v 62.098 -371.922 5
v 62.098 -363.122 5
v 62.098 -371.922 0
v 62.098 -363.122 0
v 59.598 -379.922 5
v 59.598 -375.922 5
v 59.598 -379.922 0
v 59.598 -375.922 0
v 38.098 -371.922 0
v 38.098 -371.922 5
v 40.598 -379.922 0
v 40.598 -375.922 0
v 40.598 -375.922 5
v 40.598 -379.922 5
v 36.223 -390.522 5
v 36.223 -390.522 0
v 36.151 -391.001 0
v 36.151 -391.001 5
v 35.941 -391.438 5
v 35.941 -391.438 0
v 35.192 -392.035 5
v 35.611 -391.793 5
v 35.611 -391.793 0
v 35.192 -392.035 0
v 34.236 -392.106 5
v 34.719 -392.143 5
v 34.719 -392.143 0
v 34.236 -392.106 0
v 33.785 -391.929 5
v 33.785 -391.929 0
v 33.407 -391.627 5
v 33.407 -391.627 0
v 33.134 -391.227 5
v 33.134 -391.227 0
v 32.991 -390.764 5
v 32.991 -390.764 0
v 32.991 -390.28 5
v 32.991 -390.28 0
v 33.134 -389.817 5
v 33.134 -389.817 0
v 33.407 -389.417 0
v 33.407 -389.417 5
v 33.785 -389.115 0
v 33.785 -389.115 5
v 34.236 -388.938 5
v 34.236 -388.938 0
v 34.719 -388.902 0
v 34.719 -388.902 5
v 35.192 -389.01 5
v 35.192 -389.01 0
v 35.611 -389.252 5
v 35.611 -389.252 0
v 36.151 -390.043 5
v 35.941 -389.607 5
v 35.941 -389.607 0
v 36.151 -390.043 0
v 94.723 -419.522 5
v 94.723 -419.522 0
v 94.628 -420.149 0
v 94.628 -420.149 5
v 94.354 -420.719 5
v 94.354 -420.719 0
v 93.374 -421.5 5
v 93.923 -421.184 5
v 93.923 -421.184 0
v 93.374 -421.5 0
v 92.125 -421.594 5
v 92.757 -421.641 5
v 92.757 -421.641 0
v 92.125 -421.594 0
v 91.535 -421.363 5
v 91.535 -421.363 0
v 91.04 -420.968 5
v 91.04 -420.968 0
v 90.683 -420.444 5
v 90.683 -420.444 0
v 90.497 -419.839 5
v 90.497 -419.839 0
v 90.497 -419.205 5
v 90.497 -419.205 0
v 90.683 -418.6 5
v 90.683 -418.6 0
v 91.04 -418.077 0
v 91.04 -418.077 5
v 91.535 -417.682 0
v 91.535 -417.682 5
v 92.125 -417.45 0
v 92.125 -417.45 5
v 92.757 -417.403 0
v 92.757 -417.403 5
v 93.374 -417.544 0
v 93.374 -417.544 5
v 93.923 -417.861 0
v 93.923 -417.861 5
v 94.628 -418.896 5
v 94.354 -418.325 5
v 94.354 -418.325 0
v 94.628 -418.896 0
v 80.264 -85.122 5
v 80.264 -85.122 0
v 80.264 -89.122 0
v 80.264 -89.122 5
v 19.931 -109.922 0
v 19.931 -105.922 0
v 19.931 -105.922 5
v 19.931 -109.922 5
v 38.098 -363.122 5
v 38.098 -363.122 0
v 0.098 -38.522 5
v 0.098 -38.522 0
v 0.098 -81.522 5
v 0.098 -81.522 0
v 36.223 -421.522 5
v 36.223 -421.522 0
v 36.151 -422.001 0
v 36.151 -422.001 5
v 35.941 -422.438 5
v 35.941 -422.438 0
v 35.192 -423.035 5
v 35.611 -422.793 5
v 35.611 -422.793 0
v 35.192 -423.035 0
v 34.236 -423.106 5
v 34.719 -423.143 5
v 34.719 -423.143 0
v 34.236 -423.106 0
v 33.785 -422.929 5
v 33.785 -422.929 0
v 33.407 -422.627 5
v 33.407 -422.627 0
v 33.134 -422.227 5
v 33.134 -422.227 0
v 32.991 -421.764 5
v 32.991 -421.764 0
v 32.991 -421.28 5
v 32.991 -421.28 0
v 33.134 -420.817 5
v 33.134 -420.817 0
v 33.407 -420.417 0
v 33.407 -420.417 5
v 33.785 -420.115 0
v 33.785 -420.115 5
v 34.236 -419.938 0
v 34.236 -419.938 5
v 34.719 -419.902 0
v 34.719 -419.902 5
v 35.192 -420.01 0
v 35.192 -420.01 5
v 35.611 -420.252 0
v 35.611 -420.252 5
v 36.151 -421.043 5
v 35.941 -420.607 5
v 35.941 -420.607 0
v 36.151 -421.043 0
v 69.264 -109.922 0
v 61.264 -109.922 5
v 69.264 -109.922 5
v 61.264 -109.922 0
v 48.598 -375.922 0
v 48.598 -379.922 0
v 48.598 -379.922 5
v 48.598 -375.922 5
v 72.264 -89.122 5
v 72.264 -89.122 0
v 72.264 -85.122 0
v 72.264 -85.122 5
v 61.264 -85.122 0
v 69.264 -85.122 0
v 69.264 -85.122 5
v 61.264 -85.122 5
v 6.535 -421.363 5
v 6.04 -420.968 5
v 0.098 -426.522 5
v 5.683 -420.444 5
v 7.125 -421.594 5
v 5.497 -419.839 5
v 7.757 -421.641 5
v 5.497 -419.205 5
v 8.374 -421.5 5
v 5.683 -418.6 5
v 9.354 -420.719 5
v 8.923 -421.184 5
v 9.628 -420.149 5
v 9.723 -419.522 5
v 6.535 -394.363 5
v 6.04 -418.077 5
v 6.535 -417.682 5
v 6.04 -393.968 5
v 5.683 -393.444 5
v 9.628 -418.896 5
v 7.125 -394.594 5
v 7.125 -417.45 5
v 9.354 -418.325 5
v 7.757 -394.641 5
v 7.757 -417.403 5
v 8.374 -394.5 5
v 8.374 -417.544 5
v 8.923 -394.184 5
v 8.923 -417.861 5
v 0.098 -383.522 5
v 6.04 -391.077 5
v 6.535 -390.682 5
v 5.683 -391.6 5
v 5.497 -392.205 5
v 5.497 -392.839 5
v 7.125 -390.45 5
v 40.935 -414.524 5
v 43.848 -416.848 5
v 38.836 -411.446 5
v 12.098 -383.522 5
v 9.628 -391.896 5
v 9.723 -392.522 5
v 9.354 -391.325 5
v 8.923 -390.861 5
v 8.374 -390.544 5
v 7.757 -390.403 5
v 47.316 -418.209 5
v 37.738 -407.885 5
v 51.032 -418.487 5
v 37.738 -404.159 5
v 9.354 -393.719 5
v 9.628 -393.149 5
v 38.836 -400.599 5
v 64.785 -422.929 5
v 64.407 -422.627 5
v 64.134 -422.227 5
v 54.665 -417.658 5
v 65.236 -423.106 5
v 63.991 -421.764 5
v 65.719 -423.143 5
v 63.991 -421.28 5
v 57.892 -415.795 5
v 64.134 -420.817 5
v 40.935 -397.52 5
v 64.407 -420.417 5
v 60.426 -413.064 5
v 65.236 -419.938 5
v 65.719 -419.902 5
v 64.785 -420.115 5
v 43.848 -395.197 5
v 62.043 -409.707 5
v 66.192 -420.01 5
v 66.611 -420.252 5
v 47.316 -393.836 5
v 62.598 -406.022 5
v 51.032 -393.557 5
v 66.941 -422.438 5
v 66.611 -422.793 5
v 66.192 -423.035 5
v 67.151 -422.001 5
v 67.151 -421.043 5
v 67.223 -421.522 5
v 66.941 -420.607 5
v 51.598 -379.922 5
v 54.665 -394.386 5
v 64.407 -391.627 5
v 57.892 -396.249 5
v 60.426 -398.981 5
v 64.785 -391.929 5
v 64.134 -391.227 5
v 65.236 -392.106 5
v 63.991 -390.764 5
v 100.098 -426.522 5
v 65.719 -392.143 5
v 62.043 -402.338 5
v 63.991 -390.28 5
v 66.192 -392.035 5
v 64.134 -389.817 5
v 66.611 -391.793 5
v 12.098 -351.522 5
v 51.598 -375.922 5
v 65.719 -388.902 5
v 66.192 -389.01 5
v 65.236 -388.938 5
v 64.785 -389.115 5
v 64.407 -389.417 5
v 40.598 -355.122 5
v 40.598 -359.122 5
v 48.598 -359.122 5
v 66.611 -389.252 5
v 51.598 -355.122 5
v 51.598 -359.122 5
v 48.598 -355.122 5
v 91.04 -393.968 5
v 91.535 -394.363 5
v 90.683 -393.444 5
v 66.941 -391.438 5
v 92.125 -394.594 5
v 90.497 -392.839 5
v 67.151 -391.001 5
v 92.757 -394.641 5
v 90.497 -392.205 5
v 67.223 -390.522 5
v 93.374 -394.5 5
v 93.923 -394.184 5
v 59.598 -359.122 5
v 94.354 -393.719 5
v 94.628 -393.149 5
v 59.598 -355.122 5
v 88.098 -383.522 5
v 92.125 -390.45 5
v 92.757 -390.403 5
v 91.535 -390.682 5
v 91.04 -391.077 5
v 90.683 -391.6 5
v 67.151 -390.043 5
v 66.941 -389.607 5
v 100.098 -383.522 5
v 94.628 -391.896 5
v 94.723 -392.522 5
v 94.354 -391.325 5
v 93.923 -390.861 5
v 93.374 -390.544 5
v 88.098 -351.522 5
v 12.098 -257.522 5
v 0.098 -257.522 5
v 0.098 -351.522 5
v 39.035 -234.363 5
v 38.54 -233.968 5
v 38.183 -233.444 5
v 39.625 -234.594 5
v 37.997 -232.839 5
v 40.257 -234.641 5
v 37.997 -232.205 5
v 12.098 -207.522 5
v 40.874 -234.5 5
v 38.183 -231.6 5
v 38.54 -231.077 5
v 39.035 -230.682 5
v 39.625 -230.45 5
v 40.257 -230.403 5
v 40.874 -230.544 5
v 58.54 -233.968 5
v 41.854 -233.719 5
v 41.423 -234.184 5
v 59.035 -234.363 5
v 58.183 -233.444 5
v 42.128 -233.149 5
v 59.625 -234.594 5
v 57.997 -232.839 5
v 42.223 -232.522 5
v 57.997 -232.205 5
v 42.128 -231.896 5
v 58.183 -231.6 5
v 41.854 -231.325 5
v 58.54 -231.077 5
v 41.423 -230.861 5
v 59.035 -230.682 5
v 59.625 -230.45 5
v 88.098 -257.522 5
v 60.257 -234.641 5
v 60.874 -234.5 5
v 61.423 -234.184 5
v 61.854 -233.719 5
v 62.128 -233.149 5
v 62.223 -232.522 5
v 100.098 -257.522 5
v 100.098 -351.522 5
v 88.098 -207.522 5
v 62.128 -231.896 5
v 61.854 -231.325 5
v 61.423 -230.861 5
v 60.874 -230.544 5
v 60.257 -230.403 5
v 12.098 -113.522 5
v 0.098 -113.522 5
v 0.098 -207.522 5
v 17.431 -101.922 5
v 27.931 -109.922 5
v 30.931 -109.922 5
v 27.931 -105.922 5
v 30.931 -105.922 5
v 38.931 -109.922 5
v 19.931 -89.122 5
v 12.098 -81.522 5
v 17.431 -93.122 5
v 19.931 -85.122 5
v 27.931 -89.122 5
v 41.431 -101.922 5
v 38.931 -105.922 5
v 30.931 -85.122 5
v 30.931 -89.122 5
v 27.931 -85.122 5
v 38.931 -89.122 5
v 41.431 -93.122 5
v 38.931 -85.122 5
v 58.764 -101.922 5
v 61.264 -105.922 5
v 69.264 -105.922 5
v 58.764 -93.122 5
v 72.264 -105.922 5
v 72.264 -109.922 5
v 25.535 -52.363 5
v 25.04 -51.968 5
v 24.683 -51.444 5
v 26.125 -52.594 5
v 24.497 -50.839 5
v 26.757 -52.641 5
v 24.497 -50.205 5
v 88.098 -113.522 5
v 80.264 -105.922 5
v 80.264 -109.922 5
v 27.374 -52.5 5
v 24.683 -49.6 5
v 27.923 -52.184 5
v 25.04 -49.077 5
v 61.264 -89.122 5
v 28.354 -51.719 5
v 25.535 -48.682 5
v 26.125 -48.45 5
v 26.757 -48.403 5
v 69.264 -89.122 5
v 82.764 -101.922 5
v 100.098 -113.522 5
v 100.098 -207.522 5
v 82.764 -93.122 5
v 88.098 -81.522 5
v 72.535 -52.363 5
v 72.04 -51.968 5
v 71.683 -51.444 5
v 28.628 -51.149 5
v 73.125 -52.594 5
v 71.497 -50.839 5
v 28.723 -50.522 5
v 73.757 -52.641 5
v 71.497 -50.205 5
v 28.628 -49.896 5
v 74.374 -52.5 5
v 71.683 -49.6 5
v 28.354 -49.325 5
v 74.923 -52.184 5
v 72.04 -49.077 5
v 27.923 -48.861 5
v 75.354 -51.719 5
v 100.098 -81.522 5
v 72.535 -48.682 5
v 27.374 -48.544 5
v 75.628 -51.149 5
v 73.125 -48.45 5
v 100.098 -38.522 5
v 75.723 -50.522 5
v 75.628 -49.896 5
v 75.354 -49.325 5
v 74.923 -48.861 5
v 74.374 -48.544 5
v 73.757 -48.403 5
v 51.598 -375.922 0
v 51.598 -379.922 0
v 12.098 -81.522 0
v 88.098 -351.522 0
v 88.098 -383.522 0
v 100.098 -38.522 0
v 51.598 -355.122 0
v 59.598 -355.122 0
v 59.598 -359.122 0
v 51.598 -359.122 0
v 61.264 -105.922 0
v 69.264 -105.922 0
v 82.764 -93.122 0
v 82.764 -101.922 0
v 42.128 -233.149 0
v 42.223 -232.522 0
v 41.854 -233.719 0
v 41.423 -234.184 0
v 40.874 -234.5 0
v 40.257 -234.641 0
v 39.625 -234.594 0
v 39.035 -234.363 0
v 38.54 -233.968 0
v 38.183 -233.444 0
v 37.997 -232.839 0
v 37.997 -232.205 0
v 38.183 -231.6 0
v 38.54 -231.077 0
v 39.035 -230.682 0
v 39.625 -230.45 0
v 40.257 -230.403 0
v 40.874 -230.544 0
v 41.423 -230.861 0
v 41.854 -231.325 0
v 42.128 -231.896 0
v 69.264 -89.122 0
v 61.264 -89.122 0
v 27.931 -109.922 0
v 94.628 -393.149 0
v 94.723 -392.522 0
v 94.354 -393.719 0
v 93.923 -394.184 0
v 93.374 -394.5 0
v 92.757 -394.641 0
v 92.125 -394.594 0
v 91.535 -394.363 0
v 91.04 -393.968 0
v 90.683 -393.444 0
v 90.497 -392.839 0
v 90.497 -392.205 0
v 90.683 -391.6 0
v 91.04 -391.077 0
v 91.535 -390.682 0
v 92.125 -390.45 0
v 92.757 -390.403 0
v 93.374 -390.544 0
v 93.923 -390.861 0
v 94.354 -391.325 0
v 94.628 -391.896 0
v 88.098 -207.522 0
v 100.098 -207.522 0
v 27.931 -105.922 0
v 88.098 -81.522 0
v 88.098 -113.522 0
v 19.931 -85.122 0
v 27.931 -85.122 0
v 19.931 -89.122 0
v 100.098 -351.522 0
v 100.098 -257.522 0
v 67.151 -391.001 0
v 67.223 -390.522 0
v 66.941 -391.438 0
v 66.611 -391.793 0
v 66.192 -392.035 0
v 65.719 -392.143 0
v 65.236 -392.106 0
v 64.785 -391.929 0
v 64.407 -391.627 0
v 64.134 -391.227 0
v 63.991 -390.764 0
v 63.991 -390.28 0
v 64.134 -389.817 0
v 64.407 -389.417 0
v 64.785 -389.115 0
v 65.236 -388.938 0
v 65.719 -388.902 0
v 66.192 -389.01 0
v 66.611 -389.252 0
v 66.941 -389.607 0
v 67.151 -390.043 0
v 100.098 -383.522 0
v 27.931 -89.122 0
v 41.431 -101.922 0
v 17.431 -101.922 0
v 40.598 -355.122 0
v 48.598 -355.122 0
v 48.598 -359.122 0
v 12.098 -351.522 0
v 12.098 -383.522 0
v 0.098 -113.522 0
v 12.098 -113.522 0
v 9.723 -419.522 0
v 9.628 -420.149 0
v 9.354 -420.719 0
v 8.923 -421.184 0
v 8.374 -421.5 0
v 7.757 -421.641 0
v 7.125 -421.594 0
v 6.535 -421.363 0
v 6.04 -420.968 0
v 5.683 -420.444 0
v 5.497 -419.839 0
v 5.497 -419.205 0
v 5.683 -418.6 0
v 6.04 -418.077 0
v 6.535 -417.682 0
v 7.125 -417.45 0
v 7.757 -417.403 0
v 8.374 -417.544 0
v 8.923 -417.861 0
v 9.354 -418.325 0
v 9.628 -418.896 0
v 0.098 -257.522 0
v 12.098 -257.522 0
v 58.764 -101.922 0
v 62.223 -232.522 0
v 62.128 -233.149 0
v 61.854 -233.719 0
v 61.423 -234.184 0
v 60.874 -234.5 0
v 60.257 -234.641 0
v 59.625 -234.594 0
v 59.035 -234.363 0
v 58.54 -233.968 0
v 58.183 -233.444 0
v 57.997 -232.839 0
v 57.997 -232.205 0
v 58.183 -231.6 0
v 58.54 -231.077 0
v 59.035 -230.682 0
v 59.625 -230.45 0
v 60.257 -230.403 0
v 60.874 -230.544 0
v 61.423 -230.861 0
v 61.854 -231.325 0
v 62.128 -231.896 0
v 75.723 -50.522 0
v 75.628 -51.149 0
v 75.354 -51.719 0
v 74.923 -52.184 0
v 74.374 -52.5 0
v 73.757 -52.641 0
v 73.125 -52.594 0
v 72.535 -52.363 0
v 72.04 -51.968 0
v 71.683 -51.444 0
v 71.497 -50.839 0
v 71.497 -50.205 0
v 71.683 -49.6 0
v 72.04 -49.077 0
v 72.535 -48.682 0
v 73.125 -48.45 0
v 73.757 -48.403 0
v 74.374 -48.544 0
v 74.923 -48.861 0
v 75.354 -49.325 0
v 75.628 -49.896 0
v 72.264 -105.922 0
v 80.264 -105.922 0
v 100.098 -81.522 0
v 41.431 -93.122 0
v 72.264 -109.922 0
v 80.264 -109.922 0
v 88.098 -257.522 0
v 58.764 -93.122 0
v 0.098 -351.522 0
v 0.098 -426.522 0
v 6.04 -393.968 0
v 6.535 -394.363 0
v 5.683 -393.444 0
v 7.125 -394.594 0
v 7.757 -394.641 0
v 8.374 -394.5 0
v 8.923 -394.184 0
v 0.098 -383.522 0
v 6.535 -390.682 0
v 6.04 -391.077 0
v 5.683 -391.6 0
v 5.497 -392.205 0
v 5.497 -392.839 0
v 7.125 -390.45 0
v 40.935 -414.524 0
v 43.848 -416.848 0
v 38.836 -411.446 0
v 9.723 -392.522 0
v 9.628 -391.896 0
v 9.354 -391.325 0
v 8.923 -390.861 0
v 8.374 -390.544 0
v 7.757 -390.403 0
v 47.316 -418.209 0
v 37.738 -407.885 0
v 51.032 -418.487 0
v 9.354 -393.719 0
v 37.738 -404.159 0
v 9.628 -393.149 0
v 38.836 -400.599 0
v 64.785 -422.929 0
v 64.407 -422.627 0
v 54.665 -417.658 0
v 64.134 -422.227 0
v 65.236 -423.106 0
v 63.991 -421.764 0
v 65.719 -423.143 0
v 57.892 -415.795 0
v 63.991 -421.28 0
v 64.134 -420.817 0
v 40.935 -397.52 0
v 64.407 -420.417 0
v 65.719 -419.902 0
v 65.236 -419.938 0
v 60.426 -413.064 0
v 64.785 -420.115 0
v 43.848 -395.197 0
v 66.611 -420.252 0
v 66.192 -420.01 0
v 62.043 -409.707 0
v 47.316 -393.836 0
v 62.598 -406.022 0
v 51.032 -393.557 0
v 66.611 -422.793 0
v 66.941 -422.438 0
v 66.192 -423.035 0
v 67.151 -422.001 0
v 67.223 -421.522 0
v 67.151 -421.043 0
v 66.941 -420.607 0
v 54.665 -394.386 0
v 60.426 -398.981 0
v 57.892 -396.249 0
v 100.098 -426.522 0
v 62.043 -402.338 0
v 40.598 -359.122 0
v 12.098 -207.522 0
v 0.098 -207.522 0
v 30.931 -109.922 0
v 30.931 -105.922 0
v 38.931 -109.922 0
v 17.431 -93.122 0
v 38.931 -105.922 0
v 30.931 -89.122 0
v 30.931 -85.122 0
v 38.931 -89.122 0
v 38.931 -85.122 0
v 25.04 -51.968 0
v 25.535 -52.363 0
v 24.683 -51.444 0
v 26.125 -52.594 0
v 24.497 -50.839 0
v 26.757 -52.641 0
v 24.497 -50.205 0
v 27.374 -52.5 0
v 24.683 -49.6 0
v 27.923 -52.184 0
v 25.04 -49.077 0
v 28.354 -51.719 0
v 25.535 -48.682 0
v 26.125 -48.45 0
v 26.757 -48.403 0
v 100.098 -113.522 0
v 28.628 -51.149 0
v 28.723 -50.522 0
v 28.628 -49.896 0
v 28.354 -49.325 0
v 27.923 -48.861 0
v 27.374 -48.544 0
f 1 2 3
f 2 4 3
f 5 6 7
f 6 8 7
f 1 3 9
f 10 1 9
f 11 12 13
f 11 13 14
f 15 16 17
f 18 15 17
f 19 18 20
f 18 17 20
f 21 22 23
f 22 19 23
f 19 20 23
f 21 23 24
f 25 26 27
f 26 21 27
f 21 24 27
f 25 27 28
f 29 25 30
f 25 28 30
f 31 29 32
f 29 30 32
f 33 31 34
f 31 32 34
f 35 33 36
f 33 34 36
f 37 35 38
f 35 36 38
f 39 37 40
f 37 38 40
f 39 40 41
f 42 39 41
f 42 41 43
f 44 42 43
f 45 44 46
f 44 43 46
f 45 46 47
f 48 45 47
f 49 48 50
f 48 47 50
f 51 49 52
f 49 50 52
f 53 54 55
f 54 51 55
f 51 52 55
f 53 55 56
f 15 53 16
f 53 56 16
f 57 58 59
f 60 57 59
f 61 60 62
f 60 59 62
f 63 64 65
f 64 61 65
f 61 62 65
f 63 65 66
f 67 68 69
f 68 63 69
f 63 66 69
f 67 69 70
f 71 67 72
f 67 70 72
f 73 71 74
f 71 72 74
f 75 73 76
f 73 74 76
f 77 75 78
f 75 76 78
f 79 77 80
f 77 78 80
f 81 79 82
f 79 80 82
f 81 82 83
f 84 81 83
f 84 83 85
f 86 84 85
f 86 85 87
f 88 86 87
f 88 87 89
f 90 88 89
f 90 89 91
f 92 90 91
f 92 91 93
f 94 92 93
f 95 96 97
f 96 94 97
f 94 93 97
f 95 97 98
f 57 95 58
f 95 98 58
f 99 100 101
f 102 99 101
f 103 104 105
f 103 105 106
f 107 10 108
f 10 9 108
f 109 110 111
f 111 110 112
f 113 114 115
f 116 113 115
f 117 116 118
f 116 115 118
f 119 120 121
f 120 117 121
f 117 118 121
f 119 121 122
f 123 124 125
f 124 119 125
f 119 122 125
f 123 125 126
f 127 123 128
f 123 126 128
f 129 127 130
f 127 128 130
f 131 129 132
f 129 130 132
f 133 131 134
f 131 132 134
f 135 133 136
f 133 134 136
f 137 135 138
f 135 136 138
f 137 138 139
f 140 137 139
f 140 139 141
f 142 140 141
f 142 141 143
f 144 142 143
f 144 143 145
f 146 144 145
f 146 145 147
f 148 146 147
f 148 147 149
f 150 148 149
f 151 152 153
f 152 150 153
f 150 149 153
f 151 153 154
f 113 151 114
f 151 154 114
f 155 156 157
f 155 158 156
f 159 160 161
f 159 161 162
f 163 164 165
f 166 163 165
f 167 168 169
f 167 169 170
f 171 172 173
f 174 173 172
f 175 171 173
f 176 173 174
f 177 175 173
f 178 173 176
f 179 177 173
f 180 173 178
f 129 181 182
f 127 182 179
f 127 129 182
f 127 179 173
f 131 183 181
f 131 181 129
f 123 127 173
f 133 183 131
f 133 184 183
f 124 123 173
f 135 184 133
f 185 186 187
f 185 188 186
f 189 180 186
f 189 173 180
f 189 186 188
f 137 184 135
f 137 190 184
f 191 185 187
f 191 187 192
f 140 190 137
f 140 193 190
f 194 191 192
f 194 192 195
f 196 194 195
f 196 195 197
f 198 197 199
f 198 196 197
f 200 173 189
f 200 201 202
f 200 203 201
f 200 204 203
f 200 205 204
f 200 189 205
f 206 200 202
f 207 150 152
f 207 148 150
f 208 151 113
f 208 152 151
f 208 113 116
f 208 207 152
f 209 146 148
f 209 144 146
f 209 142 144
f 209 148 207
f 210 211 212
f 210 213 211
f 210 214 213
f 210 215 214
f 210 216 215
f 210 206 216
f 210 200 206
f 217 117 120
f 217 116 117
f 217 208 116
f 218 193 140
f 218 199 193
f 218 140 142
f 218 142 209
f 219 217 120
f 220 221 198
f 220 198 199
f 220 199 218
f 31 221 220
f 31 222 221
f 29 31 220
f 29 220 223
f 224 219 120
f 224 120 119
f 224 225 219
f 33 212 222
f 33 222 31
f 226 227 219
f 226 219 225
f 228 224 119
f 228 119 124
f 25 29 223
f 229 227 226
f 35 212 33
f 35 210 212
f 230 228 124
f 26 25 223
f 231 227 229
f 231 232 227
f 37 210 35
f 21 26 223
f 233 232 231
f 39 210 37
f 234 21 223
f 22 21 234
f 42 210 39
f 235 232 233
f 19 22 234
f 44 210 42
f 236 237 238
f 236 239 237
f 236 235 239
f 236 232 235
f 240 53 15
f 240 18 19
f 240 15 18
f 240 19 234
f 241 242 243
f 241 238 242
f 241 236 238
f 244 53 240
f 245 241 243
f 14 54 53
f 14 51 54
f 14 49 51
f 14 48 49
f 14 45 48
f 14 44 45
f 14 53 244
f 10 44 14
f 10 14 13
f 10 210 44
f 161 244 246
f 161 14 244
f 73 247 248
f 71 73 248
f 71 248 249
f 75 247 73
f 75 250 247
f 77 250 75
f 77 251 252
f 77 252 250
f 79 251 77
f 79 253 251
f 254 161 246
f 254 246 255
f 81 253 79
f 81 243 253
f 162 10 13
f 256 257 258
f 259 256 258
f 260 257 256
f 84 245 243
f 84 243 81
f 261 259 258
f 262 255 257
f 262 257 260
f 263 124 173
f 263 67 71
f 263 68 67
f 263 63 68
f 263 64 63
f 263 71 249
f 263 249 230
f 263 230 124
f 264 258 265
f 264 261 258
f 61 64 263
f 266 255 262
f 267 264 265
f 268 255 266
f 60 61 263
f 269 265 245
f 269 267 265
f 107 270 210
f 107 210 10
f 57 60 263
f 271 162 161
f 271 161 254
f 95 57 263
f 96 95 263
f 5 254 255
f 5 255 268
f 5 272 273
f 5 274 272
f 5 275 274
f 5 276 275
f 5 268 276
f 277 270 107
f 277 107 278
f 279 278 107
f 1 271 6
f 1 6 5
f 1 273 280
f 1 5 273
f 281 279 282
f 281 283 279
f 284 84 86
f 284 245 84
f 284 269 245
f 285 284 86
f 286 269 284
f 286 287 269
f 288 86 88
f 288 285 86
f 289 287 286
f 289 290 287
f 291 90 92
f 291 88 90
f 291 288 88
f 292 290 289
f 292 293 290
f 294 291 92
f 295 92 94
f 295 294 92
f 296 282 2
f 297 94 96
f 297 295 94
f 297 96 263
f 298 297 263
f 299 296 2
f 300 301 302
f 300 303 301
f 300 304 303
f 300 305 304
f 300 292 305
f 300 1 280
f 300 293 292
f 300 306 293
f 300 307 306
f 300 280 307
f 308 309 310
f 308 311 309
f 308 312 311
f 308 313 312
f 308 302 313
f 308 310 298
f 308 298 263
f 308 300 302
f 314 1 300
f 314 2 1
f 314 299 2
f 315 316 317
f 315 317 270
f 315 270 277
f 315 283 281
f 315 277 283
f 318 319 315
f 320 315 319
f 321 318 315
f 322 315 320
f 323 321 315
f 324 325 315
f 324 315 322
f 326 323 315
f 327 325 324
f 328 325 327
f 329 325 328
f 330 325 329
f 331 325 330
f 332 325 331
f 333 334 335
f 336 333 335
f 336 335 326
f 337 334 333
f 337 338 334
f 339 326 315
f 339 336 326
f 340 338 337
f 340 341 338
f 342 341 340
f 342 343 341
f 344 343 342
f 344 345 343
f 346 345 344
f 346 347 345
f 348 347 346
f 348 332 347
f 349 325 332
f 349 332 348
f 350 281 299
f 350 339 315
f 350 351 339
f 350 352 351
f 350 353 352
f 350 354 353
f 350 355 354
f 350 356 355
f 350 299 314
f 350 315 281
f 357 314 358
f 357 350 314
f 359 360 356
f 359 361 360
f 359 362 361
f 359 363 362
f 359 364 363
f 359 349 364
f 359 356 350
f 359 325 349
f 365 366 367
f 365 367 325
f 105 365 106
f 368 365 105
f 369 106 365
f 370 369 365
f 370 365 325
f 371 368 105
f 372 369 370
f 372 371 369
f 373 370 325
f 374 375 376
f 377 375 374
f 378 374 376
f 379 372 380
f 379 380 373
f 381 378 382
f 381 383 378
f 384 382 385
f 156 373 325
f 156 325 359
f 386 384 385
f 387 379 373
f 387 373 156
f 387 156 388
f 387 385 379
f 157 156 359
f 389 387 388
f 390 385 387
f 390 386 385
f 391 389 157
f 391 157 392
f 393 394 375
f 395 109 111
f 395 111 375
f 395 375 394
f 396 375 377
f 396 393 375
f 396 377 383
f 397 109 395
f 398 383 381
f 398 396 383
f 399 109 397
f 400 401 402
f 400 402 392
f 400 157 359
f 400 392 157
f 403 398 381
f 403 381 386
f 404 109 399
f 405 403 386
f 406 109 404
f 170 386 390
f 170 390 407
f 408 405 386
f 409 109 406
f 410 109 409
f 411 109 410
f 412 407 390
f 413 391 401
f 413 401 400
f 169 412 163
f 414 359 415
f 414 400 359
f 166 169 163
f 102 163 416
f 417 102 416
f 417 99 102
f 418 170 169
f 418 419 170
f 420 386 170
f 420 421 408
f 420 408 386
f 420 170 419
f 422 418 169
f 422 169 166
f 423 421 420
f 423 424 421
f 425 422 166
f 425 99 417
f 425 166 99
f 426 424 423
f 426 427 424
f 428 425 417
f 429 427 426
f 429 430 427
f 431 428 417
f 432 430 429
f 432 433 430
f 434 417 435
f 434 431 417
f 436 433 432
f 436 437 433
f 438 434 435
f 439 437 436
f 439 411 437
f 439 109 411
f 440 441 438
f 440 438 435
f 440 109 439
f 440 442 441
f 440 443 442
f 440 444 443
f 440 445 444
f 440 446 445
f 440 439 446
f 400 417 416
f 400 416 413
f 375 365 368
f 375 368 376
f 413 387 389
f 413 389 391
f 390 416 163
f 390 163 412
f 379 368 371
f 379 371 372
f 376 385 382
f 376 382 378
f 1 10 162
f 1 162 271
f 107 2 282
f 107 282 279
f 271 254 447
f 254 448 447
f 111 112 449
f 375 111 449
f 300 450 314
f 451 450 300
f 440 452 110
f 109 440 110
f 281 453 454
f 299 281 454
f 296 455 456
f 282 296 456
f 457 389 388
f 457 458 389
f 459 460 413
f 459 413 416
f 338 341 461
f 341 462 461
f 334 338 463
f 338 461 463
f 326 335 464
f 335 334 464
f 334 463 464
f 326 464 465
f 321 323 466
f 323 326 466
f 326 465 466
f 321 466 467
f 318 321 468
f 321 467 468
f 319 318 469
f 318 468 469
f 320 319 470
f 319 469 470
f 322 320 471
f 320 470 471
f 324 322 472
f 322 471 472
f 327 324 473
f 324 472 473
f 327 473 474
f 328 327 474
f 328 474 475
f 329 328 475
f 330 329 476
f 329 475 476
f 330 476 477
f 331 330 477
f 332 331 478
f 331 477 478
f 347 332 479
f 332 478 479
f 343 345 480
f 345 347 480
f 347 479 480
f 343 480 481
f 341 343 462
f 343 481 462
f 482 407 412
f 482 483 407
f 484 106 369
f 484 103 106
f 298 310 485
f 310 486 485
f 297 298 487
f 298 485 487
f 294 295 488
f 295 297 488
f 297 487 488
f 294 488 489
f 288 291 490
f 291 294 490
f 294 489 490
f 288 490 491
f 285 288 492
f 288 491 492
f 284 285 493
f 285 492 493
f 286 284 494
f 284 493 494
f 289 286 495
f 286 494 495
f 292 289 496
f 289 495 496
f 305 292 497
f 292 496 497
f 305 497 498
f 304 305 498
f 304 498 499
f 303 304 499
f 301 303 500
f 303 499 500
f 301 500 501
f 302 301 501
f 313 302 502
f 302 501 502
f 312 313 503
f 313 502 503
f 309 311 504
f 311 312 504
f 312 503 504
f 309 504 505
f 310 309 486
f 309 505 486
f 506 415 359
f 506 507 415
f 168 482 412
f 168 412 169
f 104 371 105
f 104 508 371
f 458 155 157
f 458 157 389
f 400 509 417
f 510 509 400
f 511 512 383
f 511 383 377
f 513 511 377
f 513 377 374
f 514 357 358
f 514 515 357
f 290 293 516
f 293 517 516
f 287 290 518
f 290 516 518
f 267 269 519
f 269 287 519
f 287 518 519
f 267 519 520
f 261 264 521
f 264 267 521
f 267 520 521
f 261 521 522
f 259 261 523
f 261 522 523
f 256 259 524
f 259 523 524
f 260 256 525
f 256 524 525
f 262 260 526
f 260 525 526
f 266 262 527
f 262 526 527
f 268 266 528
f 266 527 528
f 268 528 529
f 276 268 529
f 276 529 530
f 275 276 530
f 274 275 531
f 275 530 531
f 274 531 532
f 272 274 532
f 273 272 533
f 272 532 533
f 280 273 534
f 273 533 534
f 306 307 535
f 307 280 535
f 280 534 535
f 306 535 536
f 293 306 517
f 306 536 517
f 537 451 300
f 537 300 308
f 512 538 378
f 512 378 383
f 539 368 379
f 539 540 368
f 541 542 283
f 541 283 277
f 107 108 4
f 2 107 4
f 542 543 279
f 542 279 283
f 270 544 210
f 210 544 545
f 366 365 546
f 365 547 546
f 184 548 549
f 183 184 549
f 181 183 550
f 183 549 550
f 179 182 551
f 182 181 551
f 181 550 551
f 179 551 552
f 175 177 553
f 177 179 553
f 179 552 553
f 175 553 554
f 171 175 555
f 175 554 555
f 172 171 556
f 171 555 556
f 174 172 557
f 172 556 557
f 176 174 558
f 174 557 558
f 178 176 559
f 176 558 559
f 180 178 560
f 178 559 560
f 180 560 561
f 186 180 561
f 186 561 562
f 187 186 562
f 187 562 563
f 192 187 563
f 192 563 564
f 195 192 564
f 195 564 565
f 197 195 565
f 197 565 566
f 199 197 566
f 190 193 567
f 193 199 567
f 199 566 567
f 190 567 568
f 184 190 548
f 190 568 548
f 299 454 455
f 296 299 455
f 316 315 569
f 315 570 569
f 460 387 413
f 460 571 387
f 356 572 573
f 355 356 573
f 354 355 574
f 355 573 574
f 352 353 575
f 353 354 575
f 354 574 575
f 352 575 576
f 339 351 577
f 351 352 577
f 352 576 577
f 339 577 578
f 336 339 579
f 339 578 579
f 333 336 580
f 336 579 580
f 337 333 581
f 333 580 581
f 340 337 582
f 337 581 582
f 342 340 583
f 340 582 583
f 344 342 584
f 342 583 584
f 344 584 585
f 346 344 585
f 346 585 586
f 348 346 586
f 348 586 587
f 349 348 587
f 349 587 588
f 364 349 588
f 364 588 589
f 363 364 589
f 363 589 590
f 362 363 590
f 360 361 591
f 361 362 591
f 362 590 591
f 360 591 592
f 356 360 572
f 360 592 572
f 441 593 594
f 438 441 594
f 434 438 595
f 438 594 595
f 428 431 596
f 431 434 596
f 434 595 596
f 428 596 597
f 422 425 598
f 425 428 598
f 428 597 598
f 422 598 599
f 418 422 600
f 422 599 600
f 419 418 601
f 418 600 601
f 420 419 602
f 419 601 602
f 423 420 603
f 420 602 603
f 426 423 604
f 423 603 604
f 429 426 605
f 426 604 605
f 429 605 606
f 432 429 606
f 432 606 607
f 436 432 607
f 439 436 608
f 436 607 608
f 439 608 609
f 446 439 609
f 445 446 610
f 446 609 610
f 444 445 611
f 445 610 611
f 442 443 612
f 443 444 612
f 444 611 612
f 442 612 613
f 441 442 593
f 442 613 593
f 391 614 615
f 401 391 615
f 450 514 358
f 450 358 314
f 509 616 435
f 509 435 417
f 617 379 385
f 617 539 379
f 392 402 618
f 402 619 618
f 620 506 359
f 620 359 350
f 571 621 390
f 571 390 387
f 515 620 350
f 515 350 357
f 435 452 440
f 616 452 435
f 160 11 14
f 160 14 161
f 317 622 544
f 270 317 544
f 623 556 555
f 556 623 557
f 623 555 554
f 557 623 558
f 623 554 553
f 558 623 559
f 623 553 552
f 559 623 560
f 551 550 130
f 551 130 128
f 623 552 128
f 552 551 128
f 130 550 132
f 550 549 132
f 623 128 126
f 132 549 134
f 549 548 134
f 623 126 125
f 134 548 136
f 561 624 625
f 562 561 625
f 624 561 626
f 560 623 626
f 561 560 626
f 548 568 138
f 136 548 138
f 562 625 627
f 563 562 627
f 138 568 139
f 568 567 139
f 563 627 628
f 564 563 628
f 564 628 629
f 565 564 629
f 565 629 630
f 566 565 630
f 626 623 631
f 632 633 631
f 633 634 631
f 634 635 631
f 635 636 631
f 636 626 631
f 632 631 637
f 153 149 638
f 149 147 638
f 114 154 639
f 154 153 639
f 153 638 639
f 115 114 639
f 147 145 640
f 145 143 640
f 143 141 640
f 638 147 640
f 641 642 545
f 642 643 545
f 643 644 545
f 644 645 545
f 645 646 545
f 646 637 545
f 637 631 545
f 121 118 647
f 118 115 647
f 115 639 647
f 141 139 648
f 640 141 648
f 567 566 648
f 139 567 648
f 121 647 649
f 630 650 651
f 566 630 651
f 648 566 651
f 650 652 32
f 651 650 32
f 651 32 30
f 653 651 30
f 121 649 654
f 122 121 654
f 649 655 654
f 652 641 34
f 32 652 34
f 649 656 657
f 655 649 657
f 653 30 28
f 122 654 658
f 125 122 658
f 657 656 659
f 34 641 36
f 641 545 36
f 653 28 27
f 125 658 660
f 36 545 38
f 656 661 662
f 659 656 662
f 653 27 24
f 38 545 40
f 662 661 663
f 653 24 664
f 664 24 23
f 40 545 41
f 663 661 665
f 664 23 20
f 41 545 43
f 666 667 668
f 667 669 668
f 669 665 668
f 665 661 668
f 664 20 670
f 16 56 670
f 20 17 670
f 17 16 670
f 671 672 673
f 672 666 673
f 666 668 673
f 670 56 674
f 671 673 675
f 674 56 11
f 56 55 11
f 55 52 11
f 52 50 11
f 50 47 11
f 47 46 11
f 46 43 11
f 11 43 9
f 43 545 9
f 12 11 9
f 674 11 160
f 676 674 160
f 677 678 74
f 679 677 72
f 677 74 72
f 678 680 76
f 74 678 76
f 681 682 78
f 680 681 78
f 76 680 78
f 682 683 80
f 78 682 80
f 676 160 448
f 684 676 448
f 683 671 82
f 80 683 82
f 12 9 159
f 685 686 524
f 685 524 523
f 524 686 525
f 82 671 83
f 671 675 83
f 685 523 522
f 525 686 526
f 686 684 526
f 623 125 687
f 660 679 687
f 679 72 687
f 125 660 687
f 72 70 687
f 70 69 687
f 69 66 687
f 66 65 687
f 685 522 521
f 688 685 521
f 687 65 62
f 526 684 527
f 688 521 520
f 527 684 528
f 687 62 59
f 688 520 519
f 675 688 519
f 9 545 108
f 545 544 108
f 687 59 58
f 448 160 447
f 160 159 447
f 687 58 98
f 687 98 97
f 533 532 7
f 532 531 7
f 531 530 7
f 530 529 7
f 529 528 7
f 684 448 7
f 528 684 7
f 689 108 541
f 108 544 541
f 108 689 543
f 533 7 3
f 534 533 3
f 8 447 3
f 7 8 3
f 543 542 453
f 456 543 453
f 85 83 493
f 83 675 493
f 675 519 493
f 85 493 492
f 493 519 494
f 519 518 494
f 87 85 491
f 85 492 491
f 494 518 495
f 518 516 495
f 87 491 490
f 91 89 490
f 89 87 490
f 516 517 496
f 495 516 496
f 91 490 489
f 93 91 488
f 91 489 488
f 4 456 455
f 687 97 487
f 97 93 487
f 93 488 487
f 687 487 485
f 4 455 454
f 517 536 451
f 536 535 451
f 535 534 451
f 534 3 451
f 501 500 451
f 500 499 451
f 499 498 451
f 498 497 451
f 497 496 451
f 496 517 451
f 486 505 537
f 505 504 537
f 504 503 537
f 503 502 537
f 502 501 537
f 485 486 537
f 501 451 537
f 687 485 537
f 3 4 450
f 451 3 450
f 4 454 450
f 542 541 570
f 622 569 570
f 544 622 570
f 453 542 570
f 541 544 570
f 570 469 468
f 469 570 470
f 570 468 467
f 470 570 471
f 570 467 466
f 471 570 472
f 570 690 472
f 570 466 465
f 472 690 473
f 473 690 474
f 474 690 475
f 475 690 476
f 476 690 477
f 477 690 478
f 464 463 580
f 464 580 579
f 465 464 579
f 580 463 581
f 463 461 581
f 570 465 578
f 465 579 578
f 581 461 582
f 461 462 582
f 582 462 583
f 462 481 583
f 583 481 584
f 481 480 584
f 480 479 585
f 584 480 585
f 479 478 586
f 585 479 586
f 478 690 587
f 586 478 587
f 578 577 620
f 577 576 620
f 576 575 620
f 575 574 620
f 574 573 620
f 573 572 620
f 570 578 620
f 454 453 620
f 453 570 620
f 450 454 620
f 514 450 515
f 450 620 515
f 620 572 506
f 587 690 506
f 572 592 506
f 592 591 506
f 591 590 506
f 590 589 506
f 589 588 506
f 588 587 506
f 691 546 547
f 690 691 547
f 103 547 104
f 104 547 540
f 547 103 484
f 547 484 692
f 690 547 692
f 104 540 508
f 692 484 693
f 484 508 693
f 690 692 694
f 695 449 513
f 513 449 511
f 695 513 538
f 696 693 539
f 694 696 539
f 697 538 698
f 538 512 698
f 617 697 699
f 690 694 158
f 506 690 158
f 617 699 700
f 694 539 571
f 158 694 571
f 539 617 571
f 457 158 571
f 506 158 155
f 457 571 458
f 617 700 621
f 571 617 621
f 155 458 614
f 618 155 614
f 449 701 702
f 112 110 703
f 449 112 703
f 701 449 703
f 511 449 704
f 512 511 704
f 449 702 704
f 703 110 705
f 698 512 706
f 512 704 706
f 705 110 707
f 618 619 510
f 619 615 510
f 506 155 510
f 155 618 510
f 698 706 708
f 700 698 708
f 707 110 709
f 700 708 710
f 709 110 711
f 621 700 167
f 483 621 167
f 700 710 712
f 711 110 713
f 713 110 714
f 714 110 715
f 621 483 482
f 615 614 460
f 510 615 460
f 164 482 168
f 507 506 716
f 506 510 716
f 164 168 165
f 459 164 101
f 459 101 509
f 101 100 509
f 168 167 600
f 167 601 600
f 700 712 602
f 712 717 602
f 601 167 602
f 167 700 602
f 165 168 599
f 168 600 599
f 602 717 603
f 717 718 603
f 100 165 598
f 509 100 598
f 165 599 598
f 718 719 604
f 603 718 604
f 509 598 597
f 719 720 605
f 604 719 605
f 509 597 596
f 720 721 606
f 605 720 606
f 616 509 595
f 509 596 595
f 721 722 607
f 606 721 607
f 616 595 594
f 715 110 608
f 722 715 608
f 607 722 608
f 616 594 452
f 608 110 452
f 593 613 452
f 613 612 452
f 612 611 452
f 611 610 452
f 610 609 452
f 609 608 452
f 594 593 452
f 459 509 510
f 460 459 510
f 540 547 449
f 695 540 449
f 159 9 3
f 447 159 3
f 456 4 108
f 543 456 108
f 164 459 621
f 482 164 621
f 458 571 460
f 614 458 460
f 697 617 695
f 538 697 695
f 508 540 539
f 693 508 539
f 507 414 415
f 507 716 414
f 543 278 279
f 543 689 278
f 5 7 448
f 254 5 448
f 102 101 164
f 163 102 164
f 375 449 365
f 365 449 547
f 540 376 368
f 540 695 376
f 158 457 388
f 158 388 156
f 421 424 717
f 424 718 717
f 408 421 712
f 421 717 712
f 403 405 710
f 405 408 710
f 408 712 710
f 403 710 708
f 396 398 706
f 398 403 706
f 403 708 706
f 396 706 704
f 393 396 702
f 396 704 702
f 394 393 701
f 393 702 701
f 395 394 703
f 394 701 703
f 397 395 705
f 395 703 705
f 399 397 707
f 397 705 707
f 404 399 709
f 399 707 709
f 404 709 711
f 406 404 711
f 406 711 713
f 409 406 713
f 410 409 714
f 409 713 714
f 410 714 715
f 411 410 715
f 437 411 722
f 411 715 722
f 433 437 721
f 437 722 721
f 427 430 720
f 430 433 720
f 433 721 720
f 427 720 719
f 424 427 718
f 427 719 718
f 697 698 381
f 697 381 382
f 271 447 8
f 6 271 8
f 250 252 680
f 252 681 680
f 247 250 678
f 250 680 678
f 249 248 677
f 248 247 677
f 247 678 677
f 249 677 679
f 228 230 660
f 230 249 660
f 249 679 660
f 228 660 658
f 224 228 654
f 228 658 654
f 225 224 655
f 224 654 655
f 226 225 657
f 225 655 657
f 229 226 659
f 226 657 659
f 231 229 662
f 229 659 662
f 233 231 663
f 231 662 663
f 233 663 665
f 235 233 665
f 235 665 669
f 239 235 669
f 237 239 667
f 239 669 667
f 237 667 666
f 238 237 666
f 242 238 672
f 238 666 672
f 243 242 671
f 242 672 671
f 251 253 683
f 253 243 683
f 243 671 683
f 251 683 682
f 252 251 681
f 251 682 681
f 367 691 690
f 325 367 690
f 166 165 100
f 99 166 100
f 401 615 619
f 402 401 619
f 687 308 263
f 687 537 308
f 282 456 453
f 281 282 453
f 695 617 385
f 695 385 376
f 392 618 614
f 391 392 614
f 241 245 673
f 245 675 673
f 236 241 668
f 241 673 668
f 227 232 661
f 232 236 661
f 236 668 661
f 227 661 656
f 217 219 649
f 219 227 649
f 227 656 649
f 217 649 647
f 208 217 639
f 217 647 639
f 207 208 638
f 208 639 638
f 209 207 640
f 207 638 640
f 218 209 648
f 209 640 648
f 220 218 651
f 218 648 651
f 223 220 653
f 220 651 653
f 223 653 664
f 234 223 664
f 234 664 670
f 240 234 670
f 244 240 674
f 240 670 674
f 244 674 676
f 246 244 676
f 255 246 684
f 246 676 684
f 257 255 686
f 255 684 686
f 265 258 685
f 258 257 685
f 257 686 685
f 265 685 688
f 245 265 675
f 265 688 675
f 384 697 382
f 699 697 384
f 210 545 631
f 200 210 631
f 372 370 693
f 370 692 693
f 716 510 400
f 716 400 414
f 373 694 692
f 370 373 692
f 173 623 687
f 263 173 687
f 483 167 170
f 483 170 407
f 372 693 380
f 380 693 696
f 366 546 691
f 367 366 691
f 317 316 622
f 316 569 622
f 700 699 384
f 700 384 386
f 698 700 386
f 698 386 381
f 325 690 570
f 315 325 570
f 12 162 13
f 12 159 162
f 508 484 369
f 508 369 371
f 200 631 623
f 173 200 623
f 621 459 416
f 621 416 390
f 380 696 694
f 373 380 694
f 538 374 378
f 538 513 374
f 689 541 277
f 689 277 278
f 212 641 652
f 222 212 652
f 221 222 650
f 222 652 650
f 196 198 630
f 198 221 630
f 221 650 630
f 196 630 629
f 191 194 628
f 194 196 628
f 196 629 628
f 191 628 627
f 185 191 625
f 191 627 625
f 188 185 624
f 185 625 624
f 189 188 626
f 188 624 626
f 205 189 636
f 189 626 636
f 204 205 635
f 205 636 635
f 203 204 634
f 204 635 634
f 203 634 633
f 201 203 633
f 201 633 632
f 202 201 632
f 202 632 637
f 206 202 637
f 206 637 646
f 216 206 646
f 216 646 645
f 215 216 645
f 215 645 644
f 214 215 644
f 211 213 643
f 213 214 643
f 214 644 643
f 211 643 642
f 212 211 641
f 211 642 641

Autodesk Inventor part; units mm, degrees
ref_plane "YZ Plane" through (0, 0, 0) normal (1, 0, 0) x (0, 1, 0)
ref_plane "XZ Plane" through (0, 0, 0) normal (0, 1, 0) x (-1, 0, 0)
ref_plane "XY Plane" through (0, 0, 0) normal (0, 0, 1) x (1, 0, 0)
sketch "Sketch1" plane through (0, 0, 0) normal (0, 0, 1) x (1, 0, 0)
  line L0 (100.0979, -38.5222) -> (0.0979, -38.5222)
  line L1 (0.0979, -426.5222) -> (100.0979, -426.5222)
  line L2 (82.7645, -93.1222) -> (58.7645, -93.1222)
  line L3 (58.7645, -93.1222) -> (58.7645, -101.9222)
  line L4 (58.7645, -101.9222) -> (82.7645, -101.9222)
  line L5 (82.7645, -101.9222) -> (82.7645, -93.1222)
  line L6 (41.4312, -93.1222) -> (17.4312, -93.1222)
  line L7 (17.4312, -93.1222) -> (17.4312, -101.9222)
  line L8 (17.4312, -101.9222) -> (41.4312, -101.9222)
  line L9 (41.4312, -101.9222) -> (41.4312, -93.1222)
  line L10 (38.0979, -363.1222) -> (62.0979, -363.1222)
  line L11 (62.0979, -363.1222) -> (62.0979, -371.9222)
  line L12 (62.0979, -371.9222) -> (38.0979, -371.9222)
  line L13 (38.0979, -371.9222) -> (38.0979, -363.1222)
  line L14 (173.8639, -93.5222) -> (-221.1361, -93.5222)
  line L15 (173.8639, -101.5222) -> (-221.1361, -101.5222)
  line L16 (173.8639, -371.5222) -> (-221.1361, -371.5222)
  line L17 (173.8639, -363.5222) -> (-221.1361, -363.5222)
  line L18 (34.8712, -93.1222) -> (34.8712, -93.5222) construction
  line L19 (34.8712, -101.5222) -> (34.8712, -101.9222) construction
  line L20 (58.7645, -93.1222) -> (41.4312, -93.1222) construction
  line L21 (10.9151, -363.1222) -> (10.9151, -363.5222) construction
  line L22 (10.9151, -371.5222) -> (10.9151, -371.9222) construction
  line L23 (38.0979, -363.1222) -> (12.0979, -363.1222) construction
  line L24 (62.0979, -363.1222) -> (88.0979, -363.1222) construction
  line L25 (0, 0) -> (0, -9.7735) construction
  circle A0 centre (65.5979, -390.5222) radius 1.625
  circle A1 centre (65.5979, -421.5222) radius 1.625
  circle A2 centre (34.5979, -421.5222) radius 1.625
  circle A3 centre (34.5979, -390.5222) radius 1.625
  line L26 (65.5979, -390.5222) -> (34.5979, -390.5222) construction
  line L27 (34.5979, -390.5222) -> (34.5979, -421.5222) construction
  line L28 (34.5979, -421.5222) -> (65.5979, -421.5222) construction
  line L29 (65.5979, -421.5222) -> (65.5979, -390.5222) construction
  circle A4 centre (50.0979, -406.0222) radius 12.5
  line L30 (50.0979, -390.5222) -> (50.0979, -406.0222) construction
  line L31 (50.0979, -406.0222) -> (65.5979, -406.0222) construction
  line L32 (72.2645, -85.1222) -> (80.2645, -85.1222)
  line L33 (80.2645, -85.1222) -> (80.2645, -89.1222)
  line L34 (80.2645, -89.1222) -> (72.2645, -89.1222)
  line L35 (72.2645, -89.1222) -> (72.2645, -85.1222)
  line L36 (80.2645, -89.1222) -> (82.7645, -89.1222) construction
  line L37 (82.7645, -89.1222) -> (82.7645, -93.1222) construction
  line L38 (69.2645, -85.1222) -> (61.2645, -85.1222)
  line L39 (61.2645, -85.1222) -> (61.2645, -89.1222)
  line L40 (61.2645, -89.1222) -> (69.2645, -89.1222)
  line L41 (69.2645, -89.1222) -> (69.2645, -85.1222)
  line L42 (58.7645, -93.1222) -> (58.7645, -89.1222) construction
  line L43 (58.7645, -89.1222) -> (61.2645, -89.1222) construction
  line L44 (72.2645, -105.9222) -> (80.2645, -105.9222)
  line L45 (80.2645, -105.9222) -> (80.2645, -109.9222)
  line L46 (80.2645, -109.9222) -> (72.2645, -109.9222)
  line L47 (72.2645, -109.9222) -> (72.2645, -105.9222)
  line L48 (80.2645, -105.9222) -> (80.2645, -101.9222) construction
  line L49 (69.2645, -105.9222) -> (61.2645, -105.9222)
  line L50 (61.2645, -105.9222) -> (61.2645, -109.9222)
  line L51 (61.2645, -109.9222) -> (69.2645, -109.9222)
  line L52 (69.2645, -109.9222) -> (69.2645, -105.9222)
  line L53 (38.9312, -85.1222) -> (30.9312, -85.1222)
  line L54 (30.9312, -85.1222) -> (30.9312, -89.1222)
  line L55 (30.9312, -89.1222) -> (38.9312, -89.1222)
  line L56 (38.9312, -89.1222) -> (38.9312, -85.1222)
  line L57 (27.9312, -85.1222) -> (19.9312, -85.1222)
  line L58 (19.9312, -85.1222) -> (19.9312, -89.1222)
  line L59 (19.9312, -89.1222) -> (27.9312, -89.1222)
  line L60 (27.9312, -89.1222) -> (27.9312, -85.1222)
  line L61 (30.9312, -105.9222) -> (38.9312, -105.9222)
  line L62 (38.9312, -105.9222) -> (38.9312, -109.9222)
  line L63 (38.9312, -109.9222) -> (30.9312, -109.9222)
  line L64 (30.9312, -109.9222) -> (30.9312, -105.9222)
  line L65 (27.9312, -105.9222) -> (19.9312, -105.9222)
  line L66 (19.9312, -105.9222) -> (19.9312, -109.9222)
  line L67 (19.9312, -109.9222) -> (27.9312, -109.9222)
  line L68 (27.9312, -109.9222) -> (27.9312, -105.9222)
  line L69 (41.4312, -93.1222) -> (41.4312, -89.1222) construction
  line L70 (41.4312, -89.1222) -> (38.9312, -89.1222) construction
  line L71 (17.4312, -93.1222) -> (17.4312, -89.1222) construction
  line L72 (17.4312, -89.1222) -> (19.9312, -89.1222) construction
  line L73 (51.5979, -355.1222) -> (59.5979, -355.1222)
  line L74 (59.5979, -355.1222) -> (59.5979, -359.1222)
  line L75 (59.5979, -359.1222) -> (51.5979, -359.1222)
  line L76 (51.5979, -359.1222) -> (51.5979, -355.1222)
  line L77 (48.5979, -355.1222) -> (40.5979, -355.1222)
  line L78 (40.5979, -355.1222) -> (40.5979, -359.1222)
  line L79 (40.5979, -359.1222) -> (48.5979, -359.1222)
  line L80 (48.5979, -359.1222) -> (48.5979, -355.1222)
  line L81 (51.5979, -375.9222) -> (59.5979, -375.9222)
  line L82 (59.5979, -375.9222) -> (59.5979, -379.9222)
  line L83 (59.5979, -379.9222) -> (51.5979, -379.9222)
  line L84 (51.5979, -379.9222) -> (51.5979, -375.9222)
  line L85 (48.5979, -375.9222) -> (40.5979, -375.9222)
  line L86 (40.5979, -375.9222) -> (40.5979, -379.9222)
  line L87 (40.5979, -379.9222) -> (48.5979, -379.9222)
  line L88 (48.5979, -379.9222) -> (48.5979, -375.9222)
  line L89 (59.5979, -359.1222) -> (62.0979, -359.1222) construction
  line L90 (62.0979, -359.1222) -> (62.0979, -363.1222) construction
  line L91 (38.0979, -363.1222) -> (38.0979, -359.1222) construction
  line L92 (38.0979, -359.1222) -> (40.5979, -359.1222) construction
  line L93 (59.5979, -375.9222) -> (59.5979, -371.9222) construction
  circle A5 centre (73.5979, -50.5222) radius 2.125
  circle A6 centre (26.5979, -50.5222) radius 2.125
  line L94 (73.5979, -50.5222) -> (100.0979, -50.5222) construction
  line L95 (26.5979, -50.5222) -> (0.0979, -50.5222) construction
  line L96 (96.5979, -57.5222) -> (88.5979, -57.5222) projected
  line L97 (11.5979, -57.5222) -> (3.5979, -57.5222) projected
  line L98 (8.0979, -43.5222) -> (8.0979, -57.5222) projected
  line L99 (7.0979, -57.5222) -> (7.0979, -43.5222) projected
  line L100 (93.0979, -43.5222) -> (93.0979, -57.5222) projected
  line L101 (92.0979, -57.5222) -> (92.0979, -43.5222) projected
  line L102 (7.5979, -57.5222) -> (7.5979, -426.5222) construction
  line L103 (92.5979, -57.5222) -> (92.5979, -426.5222) construction
  circle A7 centre (92.5979, -419.5222) radius 2.125
  circle A8 centre (92.5979, -392.5222) radius 2.125
  circle A9 centre (7.5979, -419.5222) radius 2.125
  circle A10 centre (7.5979, -392.5222) radius 2.125
  line L104 (92.5979, -419.5222) -> (7.5979, -419.5222) construction
  line L105 (92.5979, -392.5222) -> (7.5979, -392.5222) construction
  line L106 (100.0979, -38.5222) -> (100.0979, -81.5222)
  line L107 (100.0979, -81.5222) -> (88.0979, -81.5222)
  line L108 (88.0979, -81.5222) -> (88.0979, -113.5222)
  line L109 (88.0979, -113.5222) -> (100.0979, -113.5222)
  line L110 (100.0979, -351.5222) -> (88.0979, -351.5222)
  line L111 (88.0979, -351.5222) -> (88.0979, -383.5222)
  line L112 (88.0979, -383.5222) -> (100.0979, -383.5222)
  line L113 (100.0979, -383.5222) -> (100.0979, -426.5222)
  line L114 (100.0979, -81.5222) -> (100.0979, -93.5222) construction
  line L115 (100.0979, -101.5222) -> (100.0979, -113.5222) construction
  line L116 (0.0979, -38.5222) -> (0.0979, -81.5222)
  line L117 (0.0979, -81.5222) -> (12.0979, -81.5222)
  line L118 (12.0979, -81.5222) -> (12.0979, -113.5222)
  line L119 (12.0979, -113.5222) -> (0.0979, -113.5222)
  line L120 (0.0979, -351.5222) -> (12.0979, -351.5222)
  line L121 (12.0979, -351.5222) -> (12.0979, -383.5222)
  line L122 (12.0979, -383.5222) -> (0.0979, -383.5222)
  line L123 (0.0979, -383.5222) -> (0.0979, -426.5222)
  line L124 (98.1469, -351.5222) -> (98.1469, -363.5222) construction
  line L125 (98.1469, -383.5222) -> (98.1469, -371.5222) construction
  line L126 (17.4312, -93.1222) -> (12.0979, -93.1222) construction
  line L127 (82.7645, -93.1222) -> (88.0979, -93.1222) construction
  line L128 (82.7645, -97.5222) -> (100.0979, -97.5222) construction
  line L129 (58.7645, -97.5222) -> (41.4312, -97.5222) construction
  line L130 (17.4312, -97.5222) -> (0.0979, -97.5222) construction
  line L131 (38.0979, -367.5222) -> (0.0979, -367.5222) construction
  line L132 (62.0979, -367.5222) -> (100.0979, -367.5222) construction
  line L133 (100.0979, -113.5222) -> (100.0979, -207.5222)
  line L134 (100.0979, -207.5222) -> (88.0979, -207.5222)
  line L135 (88.0979, -207.5222) -> (88.0979, -257.5222)
  line L136 (88.0979, -257.5222) -> (100.0979, -257.5222)
  line L137 (100.0979, -257.5222) -> (100.0979, -351.5222)
  line L138 (0.0979, -113.5222) -> (0.0979, -207.5222)
  line L139 (0.0979, -207.5222) -> (12.0979, -207.5222)
  line L140 (12.0979, -207.5222) -> (12.0979, -257.5222)
  line L141 (12.0979, -257.5222) -> (0.0979, -257.5222)
  line L142 (0.0979, -257.5222) -> (0.0979, -351.5222)
  line L143 (34.5979, -390.5222) -> (0.0979, -390.5222) construction
  line L144 (65.5979, -390.5222) -> (100.0979, -390.5222) construction
  circle A11 centre (40.0979, -232.5222) radius 2.125
  circle A12 centre (60.0979, -232.5222) radius 2.125
  line L145 (40.0979, -232.5222) -> (60.0979, -232.5222) construction
  line L146 (40.0979, -232.5222) -> (12.0979, -232.5222) construction
  line L147 (60.0979, -232.5222) -> (88.0979, -232.5222) construction
  dimension "d1" = 24
  dimension "d2" = 8.8
  dimension "d3" = 100
  dimension "d9" = 55
  dimension "d10" = 55
  dimension "d11" = 3.25
  dimension "d12" = 31
  dimension "d13" = 5
  dimension "d14" = 25
  dimension "d15" = 4
  dimension "d16" = 8
  dimension "d17" = 4
  dimension "d18" = 2.5
  dimension "d19" = 4.25
  dimension "d20" = 4.25
  dimension "d21" = 47
  dimension "d22" = 12
  dimension "d23" = 4.25
  dimension "d24" = 4.25
  dimension "d25" = 27
  dimension "d26" = 7
  dimension "d27" = 4.25
  dimension "d28" = 4.25
  dimension "d29" = 32
  dimension "d30" = 12
  dimension "d31" = 50
  dimension "d32" = 4.25
  dimension "d33" = 4.25
  dimension "d34" = 20
  dimension "d35" = 25
extrude "Extrusion1" add sketch "Sketch1" along normal blind 5 contours L106 L107 L108 L14 L5 L2 L3 L9 L6 L7 L118 L117 L116 L0 | L108 L15 L5 L14 | L14 L7 L15 L118 | L108 L109 L133 L134 L135 L136 L137 L110 L111 L17 L11 L10 L13 L121 L120 L142 L141 L140 L139 L138 L119 L118 L15 L7 L8 L9 L3 L4 L5 | L3 L15 L9 L14 | L111 L16 L11 L17 | L17 L13 L16 L121 | L111 L112 L113 L1 L123 L122 L121 L16 L13 L12 L11
sketch "Sketch2" plane through (17.4312, -101.9222, 0) normal (1, 0, 0) x (0, 0, -1)
  circle A0 centre (6.0737, 4.4) radius 7.5
  point P0 (0, 101.9222)
  point P1 (0, 8.8)
  point P2 (0, 0)
  dimension "d6" = 15
sketch "Sketch3" plane through (38.0979, -371.9222, 0) normal (1, 0, 0) x (0, 0, -1)
  circle A0 centre (6.0737, 4.4) radius 7.5
  point P0 (0, 371.9222)
  point P1 (0, 8.8)
  point P2 (0, 0)
  dimension "d8" = 15
properties part number "XCartFloor"
